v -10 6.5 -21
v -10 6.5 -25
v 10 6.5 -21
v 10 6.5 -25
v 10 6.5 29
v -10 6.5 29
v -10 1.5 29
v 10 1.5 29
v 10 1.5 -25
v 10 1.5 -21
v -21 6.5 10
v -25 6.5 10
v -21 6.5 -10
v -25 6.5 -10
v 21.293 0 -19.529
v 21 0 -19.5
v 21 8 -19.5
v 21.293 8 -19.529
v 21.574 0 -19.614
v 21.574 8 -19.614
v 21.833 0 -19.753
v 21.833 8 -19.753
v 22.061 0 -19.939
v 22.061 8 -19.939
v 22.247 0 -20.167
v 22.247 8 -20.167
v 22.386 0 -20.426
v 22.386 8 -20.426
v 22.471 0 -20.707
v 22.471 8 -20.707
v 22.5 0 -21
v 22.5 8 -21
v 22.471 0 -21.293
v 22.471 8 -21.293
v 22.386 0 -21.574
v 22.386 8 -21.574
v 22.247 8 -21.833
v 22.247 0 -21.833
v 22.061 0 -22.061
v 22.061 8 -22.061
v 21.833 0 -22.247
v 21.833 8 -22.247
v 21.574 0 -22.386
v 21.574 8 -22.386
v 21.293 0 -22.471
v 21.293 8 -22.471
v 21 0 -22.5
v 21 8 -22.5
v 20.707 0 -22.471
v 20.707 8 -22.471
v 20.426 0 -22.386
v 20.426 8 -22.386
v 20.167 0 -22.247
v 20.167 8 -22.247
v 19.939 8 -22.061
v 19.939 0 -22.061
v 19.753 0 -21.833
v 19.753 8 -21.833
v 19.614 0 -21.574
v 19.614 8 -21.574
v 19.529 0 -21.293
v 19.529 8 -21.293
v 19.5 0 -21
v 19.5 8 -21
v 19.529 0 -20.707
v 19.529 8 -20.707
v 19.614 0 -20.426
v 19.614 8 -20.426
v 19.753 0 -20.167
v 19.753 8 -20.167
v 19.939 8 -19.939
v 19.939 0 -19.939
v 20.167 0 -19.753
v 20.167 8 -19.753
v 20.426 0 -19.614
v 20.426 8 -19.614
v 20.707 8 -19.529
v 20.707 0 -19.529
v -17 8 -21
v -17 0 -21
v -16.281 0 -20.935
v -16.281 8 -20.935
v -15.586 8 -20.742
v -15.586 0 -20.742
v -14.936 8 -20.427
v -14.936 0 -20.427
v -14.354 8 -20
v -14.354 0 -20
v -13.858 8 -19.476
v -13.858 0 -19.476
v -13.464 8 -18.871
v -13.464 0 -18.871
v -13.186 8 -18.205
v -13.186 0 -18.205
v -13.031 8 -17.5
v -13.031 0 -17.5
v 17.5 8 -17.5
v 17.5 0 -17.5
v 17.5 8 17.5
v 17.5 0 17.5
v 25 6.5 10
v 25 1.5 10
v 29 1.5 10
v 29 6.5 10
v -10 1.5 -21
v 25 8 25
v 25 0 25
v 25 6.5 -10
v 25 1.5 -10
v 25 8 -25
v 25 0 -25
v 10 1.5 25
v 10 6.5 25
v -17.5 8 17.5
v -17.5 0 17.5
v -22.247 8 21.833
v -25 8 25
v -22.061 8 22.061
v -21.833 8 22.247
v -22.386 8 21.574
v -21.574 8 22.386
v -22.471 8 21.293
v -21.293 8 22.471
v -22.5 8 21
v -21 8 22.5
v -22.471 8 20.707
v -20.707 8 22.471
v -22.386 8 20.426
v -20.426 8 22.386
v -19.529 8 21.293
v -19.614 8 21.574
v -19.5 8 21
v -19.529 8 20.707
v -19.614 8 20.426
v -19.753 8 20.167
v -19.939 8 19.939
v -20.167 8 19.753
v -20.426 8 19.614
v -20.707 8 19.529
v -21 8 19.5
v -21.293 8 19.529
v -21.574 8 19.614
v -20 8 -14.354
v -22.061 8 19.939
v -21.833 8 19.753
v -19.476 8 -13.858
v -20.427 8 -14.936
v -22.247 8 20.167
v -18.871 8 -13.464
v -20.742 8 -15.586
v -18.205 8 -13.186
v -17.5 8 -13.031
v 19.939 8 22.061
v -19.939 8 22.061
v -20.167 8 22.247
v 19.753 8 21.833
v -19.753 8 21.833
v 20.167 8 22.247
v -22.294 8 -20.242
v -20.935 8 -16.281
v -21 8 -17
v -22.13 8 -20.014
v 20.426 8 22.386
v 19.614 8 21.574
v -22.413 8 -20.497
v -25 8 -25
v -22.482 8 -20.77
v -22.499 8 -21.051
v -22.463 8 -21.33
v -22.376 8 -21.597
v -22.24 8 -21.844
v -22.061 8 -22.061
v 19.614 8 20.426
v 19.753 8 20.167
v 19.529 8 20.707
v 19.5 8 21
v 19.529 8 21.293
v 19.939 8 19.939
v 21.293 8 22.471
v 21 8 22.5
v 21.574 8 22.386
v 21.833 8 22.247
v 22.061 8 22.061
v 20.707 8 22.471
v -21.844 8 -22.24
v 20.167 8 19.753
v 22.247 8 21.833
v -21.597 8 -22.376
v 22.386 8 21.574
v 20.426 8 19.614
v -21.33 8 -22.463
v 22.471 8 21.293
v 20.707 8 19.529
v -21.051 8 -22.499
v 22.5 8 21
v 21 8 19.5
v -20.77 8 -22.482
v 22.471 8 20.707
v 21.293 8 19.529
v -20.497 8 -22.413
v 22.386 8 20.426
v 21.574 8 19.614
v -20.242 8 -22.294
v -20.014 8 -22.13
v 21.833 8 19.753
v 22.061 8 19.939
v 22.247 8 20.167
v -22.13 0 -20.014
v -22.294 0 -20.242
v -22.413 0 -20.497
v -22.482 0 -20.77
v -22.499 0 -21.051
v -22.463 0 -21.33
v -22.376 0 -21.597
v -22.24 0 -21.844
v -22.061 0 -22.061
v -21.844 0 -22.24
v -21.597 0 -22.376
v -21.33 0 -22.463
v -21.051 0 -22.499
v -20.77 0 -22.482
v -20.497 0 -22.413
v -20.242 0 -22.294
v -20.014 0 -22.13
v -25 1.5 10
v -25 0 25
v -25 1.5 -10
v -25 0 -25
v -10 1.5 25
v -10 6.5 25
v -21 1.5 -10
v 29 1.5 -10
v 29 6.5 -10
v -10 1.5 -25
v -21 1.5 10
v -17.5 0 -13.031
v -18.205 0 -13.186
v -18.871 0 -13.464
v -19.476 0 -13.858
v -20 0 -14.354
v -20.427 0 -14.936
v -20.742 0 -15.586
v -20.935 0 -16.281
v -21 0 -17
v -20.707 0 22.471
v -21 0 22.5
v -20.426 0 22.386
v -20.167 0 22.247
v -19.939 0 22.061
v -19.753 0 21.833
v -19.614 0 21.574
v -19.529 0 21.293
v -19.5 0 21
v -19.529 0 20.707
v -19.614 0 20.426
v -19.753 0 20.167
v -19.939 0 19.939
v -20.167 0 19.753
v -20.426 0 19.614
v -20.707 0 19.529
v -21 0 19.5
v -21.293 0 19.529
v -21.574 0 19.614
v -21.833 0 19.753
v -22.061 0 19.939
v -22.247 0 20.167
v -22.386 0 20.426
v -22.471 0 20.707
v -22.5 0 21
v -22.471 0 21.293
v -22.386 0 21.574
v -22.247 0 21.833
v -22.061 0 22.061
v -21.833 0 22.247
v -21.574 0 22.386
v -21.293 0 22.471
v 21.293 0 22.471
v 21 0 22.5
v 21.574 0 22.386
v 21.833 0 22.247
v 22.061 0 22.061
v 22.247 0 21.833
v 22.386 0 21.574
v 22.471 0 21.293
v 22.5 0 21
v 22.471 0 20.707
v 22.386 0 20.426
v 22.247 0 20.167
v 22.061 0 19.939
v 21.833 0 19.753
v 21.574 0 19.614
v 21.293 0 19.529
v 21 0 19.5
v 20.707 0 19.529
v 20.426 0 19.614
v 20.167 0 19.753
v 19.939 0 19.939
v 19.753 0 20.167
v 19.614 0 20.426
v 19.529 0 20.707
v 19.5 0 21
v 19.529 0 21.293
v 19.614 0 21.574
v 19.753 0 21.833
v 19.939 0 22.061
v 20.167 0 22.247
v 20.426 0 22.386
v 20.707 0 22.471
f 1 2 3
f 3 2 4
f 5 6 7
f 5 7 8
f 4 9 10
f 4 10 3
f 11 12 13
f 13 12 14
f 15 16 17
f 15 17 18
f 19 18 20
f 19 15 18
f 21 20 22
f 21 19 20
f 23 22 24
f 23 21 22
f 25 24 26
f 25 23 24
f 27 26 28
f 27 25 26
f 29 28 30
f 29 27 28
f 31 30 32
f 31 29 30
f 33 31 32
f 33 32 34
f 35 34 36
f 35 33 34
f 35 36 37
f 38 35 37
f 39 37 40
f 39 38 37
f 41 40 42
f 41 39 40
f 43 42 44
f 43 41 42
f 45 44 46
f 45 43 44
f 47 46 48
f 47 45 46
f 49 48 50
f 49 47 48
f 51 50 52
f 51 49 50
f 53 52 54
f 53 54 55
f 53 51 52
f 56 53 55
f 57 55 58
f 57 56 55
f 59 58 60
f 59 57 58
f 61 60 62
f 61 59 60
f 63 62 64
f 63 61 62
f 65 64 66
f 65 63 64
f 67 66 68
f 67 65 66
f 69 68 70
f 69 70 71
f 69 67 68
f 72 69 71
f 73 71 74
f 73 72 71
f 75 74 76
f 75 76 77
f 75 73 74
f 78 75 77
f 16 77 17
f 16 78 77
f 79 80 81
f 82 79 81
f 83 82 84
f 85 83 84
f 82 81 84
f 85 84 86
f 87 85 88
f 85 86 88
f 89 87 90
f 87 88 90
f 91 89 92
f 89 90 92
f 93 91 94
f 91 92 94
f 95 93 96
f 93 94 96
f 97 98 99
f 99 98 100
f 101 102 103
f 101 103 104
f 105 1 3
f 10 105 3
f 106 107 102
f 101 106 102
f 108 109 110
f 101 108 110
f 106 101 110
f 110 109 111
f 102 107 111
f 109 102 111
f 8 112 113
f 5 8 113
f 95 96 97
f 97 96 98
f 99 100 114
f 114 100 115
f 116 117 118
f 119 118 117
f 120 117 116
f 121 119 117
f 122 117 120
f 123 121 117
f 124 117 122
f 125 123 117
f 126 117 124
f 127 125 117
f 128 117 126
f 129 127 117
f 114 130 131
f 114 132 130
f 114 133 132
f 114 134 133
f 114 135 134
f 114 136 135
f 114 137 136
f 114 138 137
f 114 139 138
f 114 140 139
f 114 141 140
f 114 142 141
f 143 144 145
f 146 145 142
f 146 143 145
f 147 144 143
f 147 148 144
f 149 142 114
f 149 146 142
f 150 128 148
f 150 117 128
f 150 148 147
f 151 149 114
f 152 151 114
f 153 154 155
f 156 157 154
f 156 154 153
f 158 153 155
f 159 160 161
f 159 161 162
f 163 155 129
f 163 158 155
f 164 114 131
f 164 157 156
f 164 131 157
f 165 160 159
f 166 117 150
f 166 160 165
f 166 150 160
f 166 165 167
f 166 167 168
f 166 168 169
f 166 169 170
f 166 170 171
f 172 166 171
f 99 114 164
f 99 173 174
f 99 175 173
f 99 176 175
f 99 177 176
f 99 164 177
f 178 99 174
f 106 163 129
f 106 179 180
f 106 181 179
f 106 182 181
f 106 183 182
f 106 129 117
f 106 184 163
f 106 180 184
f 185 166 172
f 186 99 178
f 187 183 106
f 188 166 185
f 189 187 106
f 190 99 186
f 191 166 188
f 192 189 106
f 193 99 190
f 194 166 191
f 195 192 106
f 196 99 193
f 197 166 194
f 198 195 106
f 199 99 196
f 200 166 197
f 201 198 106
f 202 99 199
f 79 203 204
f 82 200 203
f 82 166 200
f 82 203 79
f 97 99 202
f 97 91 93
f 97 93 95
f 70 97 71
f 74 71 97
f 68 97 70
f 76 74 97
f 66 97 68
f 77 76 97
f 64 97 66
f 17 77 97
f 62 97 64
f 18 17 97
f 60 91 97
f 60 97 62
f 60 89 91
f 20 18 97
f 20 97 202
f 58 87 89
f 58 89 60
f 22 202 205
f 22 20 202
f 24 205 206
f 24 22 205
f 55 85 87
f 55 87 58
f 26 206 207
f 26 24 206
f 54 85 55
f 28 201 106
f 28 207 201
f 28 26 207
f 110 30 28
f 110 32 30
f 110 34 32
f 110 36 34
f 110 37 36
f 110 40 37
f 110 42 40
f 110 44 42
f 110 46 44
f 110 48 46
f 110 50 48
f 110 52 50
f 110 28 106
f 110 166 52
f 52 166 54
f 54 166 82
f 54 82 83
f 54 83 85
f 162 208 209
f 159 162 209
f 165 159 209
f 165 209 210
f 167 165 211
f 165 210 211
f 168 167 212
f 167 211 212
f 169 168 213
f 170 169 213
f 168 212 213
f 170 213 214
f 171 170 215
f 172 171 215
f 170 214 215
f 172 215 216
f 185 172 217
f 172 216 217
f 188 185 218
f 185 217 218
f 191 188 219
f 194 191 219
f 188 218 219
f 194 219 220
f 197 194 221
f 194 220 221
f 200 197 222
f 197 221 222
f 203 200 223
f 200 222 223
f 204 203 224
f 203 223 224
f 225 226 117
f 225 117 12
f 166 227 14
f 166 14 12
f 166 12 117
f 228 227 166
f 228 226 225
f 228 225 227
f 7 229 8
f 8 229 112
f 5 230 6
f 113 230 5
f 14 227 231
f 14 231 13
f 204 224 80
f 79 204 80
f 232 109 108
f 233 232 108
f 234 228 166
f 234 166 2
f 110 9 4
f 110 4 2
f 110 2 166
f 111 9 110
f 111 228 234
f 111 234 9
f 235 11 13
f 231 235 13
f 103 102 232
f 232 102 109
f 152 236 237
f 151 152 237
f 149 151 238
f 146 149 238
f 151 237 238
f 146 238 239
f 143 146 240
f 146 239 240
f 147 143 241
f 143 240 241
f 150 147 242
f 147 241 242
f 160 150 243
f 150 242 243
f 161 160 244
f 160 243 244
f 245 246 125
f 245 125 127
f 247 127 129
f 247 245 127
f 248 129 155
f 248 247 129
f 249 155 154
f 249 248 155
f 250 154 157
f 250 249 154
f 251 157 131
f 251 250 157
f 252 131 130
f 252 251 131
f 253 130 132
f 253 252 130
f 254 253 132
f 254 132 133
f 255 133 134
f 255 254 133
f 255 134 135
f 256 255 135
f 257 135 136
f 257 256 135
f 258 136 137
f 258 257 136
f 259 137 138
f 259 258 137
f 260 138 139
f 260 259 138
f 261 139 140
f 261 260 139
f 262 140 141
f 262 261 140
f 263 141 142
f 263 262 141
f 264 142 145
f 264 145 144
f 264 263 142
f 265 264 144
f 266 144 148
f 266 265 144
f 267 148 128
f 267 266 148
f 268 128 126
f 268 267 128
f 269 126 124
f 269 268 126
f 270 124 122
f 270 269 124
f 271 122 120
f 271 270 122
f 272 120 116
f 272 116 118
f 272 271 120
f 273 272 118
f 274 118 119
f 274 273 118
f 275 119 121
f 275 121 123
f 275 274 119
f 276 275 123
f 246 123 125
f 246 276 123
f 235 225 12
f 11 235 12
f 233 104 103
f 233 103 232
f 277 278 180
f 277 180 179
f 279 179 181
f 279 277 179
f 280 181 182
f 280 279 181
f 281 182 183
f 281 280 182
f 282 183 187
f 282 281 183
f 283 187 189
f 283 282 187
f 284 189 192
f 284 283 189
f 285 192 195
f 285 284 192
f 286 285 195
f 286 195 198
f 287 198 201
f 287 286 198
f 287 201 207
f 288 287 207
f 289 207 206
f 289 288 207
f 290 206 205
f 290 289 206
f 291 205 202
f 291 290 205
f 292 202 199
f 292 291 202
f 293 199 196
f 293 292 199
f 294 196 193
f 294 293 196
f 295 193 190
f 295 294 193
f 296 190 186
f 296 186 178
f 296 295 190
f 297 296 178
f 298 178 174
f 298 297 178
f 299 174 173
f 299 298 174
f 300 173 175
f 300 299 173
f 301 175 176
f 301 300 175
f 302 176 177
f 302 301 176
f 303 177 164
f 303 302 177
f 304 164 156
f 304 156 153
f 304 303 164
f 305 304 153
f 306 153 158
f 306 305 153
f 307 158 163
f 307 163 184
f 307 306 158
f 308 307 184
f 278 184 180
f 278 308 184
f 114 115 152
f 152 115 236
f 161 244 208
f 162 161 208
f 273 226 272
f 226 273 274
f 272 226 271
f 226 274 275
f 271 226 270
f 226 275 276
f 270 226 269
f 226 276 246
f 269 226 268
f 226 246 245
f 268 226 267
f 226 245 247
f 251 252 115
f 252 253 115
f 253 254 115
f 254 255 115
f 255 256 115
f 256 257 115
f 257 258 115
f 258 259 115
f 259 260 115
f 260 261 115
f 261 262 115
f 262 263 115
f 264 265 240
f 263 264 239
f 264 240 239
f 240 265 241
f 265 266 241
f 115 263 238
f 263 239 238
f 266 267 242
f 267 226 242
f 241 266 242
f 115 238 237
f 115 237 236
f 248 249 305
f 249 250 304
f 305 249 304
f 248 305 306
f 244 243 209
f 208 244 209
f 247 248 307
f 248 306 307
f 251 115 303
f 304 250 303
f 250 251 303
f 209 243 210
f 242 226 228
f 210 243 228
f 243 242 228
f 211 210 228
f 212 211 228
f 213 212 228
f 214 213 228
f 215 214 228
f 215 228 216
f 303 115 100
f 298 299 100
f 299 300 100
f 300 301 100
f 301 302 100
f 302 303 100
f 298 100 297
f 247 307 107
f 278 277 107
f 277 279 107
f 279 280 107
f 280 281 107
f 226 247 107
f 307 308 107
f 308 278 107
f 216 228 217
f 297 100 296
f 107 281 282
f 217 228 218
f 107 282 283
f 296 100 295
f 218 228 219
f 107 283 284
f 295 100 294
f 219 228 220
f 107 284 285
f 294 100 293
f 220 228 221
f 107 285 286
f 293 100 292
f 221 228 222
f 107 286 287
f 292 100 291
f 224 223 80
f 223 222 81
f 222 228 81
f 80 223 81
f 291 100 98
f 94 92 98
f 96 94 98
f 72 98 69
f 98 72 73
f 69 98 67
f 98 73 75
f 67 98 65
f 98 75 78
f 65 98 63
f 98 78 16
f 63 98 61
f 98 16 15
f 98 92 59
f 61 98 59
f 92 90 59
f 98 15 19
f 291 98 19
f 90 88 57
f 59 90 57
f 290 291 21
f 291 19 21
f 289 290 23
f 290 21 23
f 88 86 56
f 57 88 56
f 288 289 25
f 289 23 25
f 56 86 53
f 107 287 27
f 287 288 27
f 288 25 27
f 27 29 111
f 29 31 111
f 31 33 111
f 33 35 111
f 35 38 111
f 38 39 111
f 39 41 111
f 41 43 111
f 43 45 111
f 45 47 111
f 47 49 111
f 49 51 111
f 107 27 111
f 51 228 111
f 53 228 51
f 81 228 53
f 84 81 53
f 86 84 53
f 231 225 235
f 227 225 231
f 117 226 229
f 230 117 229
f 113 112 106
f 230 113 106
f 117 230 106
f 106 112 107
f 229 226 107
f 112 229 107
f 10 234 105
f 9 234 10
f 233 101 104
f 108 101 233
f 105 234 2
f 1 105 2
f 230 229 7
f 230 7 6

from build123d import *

# Parameters (mm, degrees)
SKETCH1_W         = 50
SKETCH1_H         = 50
SKETCH1_R         = 1.5
SUPPORT_DEPTH     = 8
NORTH_START       = -25
SKETCH2_W         = 20
SKETCH2_H         = 5
NORTH_CUT_DEPTH   = 4
SOUTH_START       = 25
SKETCH2_2_W       = 20
SKETCH2_2_H       = 5
SOUTH_DOWEL_DEPTH = 4
EAST_START        = 25
SKETCH3_W         = 20
SKETCH3_H         = 5
EAST_DOWEL_DEPTH  = 4
WEST_START        = -25
SKETCH3_3_W       = 20
SKETCH3_3_H       = 5
WEST_CUT_DEPTH    = 4


with BuildPart() as part:
    # Sketch1 → Support (new body)
    with BuildSketch(Plane(origin=(0, 0, 0), x_dir=(1, 0, 0), z_dir=(0, 1, 0))):
        Rectangle(SKETCH1_W, SKETCH1_H)
        with Locations(Location((-21, -21, 0), (0, 0, 270))):
            Circle(SKETCH1_R, mode=Mode.SUBTRACT)
        with Locations(Location((21, -21, 0), (0, 0, 270))):
            Circle(SKETCH1_R, mode=Mode.SUBTRACT)
        with BuildLine():
            Line((-13.031373033, 17.5), (17.5, 17.5))
            Line((17.5, 17.5), (17.5, -17.5))
            Line((17.5, -17.5), (-17.5, -17.5))
            Line((-17.5, -17.5), (-17.5, 13.031373033))
            ThreePointArc((-17.5, 13.031373033), (-20, 14.354248689), (-21, 17))
            Line((-21, 17), (-22.130136986, 20.01369863))
            ThreePointArc((-22.130136986, 20.01369863), (-22.060660172, 22.060660172), (-20.01369863, 22.130136986))
            Line((-20.01369863, 22.130136986), (-17, 21))
            ThreePointArc((-17, 21), (-14.354248689, 20), (-13.031373033, 17.5))
        make_face(mode=Mode.SUBTRACT)
        with Locations(Location((21, 21, 0), (0, 0, 270))):
            Circle(SKETCH1_R, mode=Mode.SUBTRACT)
    extrude(amount=SUPPORT_DEPTH)

    # Sketch2 → North Cut (cut)
    with BuildSketch(Plane.XY.offset(NORTH_START)):
        with Locations((0, 4)):
            Rectangle(SKETCH2_W, SKETCH2_H)
    extrude(amount=NORTH_CUT_DEPTH, mode=Mode.SUBTRACT)

    # Sketch2<2> → South Dowel (add)
    with BuildSketch(Plane.XY.offset(SOUTH_START)):
        with Locations((0, 4)):
            Rectangle(SKETCH2_2_W, SKETCH2_2_H)
    extrude(amount=SOUTH_DOWEL_DEPTH)

    # Sketch3 → East Dowel (add)
    with BuildSketch(Plane(origin=(0, 0, 0), x_dir=(0, 0, -1), z_dir=(1, 0, 0)).offset(EAST_START)):
        with Locations((0, 4)):
            Rectangle(SKETCH3_W, SKETCH3_H)
    extrude(amount=EAST_DOWEL_DEPTH)

    # Sketch3<3> → West Cut (cut)
    with BuildSketch(Plane(origin=(0, 0, 0), x_dir=(0, 0, -1), z_dir=(1, 0, 0)).offset(WEST_START)):
        with Locations((0, 4)):
            Rectangle(SKETCH3_3_W, SKETCH3_3_H)
    extrude(amount=WEST_CUT_DEPTH, mode=Mode.SUBTRACT)


solid = part.part
